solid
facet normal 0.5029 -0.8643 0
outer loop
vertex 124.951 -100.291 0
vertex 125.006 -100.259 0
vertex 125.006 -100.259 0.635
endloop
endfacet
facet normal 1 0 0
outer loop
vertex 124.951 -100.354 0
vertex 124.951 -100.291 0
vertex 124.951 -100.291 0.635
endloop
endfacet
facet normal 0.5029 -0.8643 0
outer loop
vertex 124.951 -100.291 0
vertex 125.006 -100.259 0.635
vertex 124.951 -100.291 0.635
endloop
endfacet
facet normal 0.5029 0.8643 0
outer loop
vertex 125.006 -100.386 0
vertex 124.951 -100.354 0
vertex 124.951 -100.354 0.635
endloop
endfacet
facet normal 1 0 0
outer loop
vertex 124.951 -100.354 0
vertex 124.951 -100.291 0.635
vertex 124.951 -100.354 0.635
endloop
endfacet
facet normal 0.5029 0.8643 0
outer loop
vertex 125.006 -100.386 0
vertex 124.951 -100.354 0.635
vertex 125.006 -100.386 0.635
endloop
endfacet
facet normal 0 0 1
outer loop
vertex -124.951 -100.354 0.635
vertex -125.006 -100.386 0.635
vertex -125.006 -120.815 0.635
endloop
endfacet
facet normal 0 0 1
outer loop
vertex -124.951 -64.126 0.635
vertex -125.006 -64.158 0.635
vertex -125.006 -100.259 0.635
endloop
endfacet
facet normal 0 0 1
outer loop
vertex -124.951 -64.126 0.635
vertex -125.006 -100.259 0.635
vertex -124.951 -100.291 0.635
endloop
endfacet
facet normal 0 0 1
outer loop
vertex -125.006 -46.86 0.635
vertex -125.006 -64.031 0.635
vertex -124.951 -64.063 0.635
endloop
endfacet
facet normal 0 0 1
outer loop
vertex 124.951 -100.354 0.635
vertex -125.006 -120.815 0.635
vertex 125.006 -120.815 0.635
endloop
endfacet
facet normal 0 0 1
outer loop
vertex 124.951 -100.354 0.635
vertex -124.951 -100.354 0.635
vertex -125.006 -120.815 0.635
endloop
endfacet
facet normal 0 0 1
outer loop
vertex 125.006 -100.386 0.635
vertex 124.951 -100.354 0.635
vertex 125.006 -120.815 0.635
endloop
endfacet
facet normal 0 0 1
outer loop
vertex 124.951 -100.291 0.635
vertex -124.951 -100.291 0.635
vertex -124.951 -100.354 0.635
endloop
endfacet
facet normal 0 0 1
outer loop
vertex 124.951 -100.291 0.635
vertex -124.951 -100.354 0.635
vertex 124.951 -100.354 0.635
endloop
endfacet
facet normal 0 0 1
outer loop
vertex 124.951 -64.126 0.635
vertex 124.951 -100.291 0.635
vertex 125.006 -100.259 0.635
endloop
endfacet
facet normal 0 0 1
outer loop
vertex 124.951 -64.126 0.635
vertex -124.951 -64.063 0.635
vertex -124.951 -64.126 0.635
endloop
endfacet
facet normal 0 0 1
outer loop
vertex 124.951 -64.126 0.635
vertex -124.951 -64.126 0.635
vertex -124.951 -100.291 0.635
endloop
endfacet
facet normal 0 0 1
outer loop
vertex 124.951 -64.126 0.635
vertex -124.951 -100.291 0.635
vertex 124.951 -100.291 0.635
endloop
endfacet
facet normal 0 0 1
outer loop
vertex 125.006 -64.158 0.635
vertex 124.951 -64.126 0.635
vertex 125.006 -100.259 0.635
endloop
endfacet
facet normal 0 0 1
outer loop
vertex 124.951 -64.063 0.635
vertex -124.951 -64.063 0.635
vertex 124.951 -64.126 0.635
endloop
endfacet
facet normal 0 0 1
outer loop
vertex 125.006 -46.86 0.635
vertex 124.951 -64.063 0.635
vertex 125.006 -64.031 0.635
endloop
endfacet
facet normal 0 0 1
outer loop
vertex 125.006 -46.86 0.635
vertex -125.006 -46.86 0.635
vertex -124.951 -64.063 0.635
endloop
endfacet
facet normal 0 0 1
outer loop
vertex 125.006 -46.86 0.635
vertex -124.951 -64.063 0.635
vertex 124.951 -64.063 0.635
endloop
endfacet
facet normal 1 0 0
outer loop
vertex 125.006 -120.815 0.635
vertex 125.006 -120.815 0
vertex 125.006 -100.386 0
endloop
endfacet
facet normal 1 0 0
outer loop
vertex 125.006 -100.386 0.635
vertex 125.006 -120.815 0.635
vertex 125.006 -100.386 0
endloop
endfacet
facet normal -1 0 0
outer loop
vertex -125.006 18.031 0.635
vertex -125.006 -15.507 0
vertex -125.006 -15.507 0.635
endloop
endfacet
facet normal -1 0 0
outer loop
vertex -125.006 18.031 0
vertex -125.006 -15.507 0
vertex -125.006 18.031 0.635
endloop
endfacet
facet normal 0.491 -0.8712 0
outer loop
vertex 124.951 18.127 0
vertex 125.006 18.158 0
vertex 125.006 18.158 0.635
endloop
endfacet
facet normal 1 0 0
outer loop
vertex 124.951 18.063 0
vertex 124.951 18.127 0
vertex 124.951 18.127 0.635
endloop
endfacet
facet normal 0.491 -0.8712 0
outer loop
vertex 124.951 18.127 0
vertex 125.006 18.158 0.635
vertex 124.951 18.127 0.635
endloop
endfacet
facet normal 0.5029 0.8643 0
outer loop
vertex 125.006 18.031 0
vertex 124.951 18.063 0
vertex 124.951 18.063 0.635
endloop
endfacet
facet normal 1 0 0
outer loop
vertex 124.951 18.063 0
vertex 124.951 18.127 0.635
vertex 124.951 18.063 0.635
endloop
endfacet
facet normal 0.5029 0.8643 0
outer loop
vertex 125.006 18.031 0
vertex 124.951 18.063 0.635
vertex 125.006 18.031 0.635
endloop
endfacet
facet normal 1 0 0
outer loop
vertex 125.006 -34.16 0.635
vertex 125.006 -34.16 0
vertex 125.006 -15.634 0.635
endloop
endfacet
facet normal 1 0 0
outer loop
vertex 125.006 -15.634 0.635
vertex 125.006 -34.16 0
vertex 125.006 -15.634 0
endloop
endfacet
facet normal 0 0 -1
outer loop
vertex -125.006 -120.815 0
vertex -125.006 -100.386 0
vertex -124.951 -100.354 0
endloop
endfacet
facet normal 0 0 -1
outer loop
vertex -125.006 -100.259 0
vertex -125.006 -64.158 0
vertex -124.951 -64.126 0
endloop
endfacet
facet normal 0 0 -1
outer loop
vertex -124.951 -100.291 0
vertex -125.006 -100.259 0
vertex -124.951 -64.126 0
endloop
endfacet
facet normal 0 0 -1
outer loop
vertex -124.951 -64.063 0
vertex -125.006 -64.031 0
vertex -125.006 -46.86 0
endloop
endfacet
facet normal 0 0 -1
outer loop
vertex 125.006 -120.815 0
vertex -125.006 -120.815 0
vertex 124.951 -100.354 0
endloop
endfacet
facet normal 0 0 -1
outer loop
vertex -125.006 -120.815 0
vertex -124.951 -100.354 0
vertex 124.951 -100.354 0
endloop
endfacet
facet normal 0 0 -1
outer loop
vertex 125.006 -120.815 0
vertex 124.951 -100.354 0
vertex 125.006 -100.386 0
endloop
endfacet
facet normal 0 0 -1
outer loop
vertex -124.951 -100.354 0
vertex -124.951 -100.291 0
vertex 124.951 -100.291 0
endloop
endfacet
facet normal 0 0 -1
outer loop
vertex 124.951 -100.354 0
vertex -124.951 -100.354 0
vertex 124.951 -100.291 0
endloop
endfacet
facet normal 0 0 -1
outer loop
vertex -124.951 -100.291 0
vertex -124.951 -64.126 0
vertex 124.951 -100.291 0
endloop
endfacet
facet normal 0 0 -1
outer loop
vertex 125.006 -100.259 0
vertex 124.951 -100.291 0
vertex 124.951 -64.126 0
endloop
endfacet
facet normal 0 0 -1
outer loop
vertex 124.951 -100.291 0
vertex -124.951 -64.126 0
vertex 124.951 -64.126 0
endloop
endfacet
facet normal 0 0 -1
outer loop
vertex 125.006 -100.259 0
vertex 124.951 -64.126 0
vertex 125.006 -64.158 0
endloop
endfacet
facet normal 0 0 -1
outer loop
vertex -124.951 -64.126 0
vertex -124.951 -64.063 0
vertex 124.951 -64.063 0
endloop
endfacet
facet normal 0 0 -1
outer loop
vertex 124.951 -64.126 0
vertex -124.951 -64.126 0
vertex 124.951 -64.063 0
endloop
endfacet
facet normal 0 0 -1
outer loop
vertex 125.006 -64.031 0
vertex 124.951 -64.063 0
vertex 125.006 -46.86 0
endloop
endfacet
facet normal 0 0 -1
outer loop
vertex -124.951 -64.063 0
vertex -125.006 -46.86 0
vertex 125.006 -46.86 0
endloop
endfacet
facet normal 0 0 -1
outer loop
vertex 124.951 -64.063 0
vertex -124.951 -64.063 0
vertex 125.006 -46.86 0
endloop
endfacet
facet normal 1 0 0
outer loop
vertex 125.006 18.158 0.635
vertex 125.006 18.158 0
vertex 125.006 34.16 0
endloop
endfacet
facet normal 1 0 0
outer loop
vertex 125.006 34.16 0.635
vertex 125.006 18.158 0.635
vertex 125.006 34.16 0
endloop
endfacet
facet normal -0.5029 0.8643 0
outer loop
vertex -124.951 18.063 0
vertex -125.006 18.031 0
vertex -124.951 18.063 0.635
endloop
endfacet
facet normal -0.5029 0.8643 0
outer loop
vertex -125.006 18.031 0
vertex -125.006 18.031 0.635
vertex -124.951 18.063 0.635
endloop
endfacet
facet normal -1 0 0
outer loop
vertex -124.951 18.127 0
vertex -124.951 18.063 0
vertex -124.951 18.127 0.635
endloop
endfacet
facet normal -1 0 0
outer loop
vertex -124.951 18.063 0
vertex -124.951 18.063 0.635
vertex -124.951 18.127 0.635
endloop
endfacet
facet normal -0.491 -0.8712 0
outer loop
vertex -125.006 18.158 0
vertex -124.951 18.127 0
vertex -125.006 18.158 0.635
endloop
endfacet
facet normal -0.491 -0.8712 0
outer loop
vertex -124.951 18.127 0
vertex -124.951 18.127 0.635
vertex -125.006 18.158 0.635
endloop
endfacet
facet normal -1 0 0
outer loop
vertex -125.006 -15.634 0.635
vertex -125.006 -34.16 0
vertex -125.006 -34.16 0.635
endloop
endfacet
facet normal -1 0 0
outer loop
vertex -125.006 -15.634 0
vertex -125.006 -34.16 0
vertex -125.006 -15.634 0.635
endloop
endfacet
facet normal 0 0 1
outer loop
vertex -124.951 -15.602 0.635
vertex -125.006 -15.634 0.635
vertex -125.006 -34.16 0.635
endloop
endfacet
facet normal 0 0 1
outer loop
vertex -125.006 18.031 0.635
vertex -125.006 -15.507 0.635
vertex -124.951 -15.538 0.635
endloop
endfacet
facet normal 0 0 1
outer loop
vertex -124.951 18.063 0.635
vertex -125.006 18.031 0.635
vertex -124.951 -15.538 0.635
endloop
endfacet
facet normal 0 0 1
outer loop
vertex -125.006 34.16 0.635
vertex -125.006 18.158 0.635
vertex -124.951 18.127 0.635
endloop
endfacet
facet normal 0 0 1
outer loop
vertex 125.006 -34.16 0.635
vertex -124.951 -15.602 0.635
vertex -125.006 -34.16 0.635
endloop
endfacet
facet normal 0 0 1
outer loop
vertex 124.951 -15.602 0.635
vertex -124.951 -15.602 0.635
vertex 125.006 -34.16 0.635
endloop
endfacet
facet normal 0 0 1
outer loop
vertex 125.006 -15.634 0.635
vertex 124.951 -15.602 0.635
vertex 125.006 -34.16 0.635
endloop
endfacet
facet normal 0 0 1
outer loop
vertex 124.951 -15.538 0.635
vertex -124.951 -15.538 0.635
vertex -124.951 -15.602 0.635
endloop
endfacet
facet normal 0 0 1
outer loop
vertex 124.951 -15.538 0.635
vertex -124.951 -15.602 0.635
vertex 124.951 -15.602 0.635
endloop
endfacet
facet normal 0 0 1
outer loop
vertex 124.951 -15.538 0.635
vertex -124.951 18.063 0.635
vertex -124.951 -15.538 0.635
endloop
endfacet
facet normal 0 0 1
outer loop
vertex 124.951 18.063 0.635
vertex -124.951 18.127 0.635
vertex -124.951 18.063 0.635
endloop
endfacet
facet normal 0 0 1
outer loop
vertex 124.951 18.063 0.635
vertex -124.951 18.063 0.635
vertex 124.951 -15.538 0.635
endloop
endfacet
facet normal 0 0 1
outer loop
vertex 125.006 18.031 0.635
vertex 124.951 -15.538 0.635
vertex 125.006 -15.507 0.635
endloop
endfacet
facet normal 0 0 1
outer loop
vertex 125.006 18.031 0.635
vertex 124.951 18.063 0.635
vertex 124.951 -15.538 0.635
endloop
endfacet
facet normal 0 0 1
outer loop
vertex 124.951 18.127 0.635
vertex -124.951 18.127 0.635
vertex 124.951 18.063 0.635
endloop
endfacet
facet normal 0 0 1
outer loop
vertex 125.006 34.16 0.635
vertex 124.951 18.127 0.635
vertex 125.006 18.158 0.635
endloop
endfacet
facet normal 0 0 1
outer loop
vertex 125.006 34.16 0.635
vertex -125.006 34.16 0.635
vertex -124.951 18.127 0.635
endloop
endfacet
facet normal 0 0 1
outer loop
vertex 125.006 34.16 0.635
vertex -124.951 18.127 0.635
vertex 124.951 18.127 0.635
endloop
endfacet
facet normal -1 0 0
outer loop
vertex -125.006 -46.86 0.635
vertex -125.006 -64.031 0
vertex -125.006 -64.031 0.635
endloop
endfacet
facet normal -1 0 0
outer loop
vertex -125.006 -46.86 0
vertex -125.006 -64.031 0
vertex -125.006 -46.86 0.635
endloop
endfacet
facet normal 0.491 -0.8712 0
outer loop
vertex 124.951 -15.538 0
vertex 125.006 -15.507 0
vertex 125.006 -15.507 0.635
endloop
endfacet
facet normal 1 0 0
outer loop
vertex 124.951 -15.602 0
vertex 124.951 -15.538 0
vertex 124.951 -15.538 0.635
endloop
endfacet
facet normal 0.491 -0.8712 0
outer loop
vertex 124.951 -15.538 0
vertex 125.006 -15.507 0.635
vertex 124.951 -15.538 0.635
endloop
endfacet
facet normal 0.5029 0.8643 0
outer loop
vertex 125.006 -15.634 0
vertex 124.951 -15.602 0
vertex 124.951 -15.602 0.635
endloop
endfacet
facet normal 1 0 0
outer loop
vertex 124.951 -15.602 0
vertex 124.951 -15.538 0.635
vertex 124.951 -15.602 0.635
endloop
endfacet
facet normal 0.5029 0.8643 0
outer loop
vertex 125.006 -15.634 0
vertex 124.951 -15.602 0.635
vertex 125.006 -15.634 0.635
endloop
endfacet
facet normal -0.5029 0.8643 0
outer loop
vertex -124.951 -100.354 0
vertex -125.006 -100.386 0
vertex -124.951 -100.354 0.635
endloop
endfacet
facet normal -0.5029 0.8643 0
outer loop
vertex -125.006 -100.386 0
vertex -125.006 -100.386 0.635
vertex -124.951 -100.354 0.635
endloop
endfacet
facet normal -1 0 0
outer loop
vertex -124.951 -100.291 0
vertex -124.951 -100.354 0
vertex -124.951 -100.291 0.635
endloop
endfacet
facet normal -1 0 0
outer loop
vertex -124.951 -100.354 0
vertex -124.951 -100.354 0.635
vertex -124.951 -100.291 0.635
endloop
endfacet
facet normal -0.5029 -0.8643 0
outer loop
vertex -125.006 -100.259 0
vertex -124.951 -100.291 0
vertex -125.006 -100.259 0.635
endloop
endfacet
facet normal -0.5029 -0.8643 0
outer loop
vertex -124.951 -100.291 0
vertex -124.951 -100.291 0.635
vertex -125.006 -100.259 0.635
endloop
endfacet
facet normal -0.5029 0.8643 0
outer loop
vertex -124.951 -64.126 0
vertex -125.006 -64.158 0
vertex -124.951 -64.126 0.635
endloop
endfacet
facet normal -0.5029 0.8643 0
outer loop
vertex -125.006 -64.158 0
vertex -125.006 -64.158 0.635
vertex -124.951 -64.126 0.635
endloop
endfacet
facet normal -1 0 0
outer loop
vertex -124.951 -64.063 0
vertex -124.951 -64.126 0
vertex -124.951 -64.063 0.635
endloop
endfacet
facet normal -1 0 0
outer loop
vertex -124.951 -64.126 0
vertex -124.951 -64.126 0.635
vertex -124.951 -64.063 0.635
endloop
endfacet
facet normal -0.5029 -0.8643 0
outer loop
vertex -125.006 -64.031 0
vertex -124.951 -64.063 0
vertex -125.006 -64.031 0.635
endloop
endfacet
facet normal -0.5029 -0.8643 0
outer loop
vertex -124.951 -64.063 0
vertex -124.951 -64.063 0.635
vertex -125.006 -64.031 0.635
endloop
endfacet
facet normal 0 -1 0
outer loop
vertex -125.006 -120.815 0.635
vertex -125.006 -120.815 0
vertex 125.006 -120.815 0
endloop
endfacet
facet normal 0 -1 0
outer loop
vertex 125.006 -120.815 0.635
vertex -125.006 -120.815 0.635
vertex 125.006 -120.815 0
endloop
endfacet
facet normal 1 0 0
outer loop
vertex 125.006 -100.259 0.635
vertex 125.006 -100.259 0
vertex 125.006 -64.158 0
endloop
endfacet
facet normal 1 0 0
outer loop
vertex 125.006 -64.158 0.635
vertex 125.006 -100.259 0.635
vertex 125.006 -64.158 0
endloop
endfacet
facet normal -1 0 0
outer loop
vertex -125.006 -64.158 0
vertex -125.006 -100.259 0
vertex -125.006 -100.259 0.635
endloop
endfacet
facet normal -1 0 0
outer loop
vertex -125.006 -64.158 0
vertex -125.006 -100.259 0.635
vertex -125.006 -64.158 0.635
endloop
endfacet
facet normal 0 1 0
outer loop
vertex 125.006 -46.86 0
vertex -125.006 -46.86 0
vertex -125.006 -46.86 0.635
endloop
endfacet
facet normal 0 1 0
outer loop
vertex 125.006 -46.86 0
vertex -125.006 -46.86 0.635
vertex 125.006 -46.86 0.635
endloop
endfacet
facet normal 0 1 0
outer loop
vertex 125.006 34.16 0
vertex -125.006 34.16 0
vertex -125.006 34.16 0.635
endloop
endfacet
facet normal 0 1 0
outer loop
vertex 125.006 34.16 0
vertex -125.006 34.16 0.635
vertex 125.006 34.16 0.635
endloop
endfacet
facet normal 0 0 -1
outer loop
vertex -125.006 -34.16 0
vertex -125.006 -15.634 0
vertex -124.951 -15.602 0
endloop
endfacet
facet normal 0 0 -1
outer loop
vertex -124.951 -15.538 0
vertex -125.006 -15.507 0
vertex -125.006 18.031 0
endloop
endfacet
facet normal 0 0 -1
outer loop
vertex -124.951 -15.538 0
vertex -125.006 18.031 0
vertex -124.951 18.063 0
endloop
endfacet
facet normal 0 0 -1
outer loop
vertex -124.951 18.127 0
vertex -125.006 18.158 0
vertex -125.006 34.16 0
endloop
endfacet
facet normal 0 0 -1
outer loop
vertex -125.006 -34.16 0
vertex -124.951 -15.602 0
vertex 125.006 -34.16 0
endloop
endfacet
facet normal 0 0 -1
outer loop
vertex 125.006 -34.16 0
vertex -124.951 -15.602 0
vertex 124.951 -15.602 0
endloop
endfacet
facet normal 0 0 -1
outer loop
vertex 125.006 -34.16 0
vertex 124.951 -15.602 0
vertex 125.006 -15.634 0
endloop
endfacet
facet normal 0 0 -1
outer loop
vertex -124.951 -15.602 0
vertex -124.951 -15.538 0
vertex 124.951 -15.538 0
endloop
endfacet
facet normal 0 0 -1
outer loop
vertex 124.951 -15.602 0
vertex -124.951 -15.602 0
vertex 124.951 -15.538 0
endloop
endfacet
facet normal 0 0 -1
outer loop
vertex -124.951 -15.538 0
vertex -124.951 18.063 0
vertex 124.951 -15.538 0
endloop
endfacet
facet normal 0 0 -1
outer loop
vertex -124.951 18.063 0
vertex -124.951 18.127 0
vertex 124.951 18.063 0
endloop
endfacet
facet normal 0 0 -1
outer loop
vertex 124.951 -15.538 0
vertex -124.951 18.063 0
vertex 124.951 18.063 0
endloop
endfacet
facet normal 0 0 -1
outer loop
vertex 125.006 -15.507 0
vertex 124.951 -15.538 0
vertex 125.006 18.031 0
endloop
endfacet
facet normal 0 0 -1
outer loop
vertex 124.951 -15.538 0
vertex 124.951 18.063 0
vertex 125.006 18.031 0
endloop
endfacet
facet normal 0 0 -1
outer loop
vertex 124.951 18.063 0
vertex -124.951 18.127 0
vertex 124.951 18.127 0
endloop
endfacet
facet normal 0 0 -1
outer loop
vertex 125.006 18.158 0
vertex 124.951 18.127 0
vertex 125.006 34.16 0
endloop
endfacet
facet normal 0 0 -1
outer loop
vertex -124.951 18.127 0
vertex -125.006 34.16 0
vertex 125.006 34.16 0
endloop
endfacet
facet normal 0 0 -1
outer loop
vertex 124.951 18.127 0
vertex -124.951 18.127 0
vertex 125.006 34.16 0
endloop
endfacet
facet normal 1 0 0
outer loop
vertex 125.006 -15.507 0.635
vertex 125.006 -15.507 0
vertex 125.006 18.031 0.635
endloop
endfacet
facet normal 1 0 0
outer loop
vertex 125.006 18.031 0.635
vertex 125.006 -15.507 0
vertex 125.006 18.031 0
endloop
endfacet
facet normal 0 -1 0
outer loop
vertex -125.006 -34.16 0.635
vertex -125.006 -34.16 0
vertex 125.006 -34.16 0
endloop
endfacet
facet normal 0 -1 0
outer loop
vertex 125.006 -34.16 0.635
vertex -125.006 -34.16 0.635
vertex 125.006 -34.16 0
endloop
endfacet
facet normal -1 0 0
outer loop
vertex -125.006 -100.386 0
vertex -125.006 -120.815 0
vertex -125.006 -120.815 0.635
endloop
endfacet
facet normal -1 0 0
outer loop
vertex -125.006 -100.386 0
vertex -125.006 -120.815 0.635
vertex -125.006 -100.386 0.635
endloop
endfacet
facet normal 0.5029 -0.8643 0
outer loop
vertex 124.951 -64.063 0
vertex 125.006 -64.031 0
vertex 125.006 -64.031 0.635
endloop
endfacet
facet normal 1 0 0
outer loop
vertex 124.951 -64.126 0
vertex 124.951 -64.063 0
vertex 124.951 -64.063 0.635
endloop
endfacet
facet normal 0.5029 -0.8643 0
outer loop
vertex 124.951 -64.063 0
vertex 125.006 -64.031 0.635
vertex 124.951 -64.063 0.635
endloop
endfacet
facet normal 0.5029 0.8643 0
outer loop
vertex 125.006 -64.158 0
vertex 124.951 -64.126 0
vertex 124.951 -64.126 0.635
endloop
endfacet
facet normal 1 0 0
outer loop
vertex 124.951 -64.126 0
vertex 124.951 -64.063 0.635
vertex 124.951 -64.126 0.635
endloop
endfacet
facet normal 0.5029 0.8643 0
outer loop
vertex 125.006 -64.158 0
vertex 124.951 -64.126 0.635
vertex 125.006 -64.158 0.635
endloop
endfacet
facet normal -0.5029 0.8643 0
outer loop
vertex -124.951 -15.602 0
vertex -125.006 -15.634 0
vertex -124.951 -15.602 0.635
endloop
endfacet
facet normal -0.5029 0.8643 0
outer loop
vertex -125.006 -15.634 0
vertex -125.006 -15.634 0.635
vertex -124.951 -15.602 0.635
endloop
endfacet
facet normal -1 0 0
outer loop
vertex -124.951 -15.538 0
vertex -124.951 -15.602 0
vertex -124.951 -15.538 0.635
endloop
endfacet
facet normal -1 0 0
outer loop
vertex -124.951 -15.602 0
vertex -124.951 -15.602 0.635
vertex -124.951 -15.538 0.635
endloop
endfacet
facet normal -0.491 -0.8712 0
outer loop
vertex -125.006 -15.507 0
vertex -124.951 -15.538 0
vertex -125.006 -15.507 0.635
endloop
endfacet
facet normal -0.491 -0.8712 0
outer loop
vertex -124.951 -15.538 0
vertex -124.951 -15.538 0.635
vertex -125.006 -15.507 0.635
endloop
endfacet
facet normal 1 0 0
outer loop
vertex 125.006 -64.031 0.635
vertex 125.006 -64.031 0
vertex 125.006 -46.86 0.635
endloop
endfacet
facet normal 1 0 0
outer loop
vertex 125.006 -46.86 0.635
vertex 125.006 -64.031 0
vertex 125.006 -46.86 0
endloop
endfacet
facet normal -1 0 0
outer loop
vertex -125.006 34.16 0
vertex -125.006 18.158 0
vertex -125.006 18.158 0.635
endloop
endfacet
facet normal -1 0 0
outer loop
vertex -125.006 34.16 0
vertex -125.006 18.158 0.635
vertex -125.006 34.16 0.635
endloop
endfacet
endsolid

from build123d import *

# Parameters (mm, degrees)
F0_W       = 250.0122
F0_H       = 68.32092
F1_DEPTH   = 0.635
F2_W       = 250.0122
F2_H       = 73.95464
F3_DEPTH   = 0.635
F4_D       = 0.127
F4_ON_F2_D = 0.127


with BuildPart() as f1:
    # F0 (on Top) → F1 (new body)
    with BuildSketch(Plane.XY):
        Rectangle(F0_W, F0_H)
    extrude(amount=F1_DEPTH)

    # F4 (through all)
    with Locations(Plane(origin=(0, 0, 0), x_dir=(1, 0, 0), z_dir=(0, 0, -1))):
        with Locations((-125.0061, -18.09496), (-125.0061, 15.5702), (125.0061, 15.5702), (125.0061, -18.09496)):
            Hole(F4_D / 2)


with BuildPart() as f3:
    # F2 (on Top) → F3 (new body)
    with BuildSketch(Plane.XY):
        with Locations((0, -83.83778)):
            Rectangle(F2_W, F2_H)
    extrude(amount=F3_DEPTH)

    # F4 on F2 (through all)
    with Locations(Plane(origin=(0, 0, 0), x_dir=(1, 0, 0), z_dir=(0, 0, -1))):
        with Locations((-125.0061, 64.09436), (-125.0061, 100.32238), (125.0061, 100.32238), (125.0061, 64.09436)):
            Hole(F4_ON_F2_D / 2)


solid = Compound([f1.part, f3.part])
